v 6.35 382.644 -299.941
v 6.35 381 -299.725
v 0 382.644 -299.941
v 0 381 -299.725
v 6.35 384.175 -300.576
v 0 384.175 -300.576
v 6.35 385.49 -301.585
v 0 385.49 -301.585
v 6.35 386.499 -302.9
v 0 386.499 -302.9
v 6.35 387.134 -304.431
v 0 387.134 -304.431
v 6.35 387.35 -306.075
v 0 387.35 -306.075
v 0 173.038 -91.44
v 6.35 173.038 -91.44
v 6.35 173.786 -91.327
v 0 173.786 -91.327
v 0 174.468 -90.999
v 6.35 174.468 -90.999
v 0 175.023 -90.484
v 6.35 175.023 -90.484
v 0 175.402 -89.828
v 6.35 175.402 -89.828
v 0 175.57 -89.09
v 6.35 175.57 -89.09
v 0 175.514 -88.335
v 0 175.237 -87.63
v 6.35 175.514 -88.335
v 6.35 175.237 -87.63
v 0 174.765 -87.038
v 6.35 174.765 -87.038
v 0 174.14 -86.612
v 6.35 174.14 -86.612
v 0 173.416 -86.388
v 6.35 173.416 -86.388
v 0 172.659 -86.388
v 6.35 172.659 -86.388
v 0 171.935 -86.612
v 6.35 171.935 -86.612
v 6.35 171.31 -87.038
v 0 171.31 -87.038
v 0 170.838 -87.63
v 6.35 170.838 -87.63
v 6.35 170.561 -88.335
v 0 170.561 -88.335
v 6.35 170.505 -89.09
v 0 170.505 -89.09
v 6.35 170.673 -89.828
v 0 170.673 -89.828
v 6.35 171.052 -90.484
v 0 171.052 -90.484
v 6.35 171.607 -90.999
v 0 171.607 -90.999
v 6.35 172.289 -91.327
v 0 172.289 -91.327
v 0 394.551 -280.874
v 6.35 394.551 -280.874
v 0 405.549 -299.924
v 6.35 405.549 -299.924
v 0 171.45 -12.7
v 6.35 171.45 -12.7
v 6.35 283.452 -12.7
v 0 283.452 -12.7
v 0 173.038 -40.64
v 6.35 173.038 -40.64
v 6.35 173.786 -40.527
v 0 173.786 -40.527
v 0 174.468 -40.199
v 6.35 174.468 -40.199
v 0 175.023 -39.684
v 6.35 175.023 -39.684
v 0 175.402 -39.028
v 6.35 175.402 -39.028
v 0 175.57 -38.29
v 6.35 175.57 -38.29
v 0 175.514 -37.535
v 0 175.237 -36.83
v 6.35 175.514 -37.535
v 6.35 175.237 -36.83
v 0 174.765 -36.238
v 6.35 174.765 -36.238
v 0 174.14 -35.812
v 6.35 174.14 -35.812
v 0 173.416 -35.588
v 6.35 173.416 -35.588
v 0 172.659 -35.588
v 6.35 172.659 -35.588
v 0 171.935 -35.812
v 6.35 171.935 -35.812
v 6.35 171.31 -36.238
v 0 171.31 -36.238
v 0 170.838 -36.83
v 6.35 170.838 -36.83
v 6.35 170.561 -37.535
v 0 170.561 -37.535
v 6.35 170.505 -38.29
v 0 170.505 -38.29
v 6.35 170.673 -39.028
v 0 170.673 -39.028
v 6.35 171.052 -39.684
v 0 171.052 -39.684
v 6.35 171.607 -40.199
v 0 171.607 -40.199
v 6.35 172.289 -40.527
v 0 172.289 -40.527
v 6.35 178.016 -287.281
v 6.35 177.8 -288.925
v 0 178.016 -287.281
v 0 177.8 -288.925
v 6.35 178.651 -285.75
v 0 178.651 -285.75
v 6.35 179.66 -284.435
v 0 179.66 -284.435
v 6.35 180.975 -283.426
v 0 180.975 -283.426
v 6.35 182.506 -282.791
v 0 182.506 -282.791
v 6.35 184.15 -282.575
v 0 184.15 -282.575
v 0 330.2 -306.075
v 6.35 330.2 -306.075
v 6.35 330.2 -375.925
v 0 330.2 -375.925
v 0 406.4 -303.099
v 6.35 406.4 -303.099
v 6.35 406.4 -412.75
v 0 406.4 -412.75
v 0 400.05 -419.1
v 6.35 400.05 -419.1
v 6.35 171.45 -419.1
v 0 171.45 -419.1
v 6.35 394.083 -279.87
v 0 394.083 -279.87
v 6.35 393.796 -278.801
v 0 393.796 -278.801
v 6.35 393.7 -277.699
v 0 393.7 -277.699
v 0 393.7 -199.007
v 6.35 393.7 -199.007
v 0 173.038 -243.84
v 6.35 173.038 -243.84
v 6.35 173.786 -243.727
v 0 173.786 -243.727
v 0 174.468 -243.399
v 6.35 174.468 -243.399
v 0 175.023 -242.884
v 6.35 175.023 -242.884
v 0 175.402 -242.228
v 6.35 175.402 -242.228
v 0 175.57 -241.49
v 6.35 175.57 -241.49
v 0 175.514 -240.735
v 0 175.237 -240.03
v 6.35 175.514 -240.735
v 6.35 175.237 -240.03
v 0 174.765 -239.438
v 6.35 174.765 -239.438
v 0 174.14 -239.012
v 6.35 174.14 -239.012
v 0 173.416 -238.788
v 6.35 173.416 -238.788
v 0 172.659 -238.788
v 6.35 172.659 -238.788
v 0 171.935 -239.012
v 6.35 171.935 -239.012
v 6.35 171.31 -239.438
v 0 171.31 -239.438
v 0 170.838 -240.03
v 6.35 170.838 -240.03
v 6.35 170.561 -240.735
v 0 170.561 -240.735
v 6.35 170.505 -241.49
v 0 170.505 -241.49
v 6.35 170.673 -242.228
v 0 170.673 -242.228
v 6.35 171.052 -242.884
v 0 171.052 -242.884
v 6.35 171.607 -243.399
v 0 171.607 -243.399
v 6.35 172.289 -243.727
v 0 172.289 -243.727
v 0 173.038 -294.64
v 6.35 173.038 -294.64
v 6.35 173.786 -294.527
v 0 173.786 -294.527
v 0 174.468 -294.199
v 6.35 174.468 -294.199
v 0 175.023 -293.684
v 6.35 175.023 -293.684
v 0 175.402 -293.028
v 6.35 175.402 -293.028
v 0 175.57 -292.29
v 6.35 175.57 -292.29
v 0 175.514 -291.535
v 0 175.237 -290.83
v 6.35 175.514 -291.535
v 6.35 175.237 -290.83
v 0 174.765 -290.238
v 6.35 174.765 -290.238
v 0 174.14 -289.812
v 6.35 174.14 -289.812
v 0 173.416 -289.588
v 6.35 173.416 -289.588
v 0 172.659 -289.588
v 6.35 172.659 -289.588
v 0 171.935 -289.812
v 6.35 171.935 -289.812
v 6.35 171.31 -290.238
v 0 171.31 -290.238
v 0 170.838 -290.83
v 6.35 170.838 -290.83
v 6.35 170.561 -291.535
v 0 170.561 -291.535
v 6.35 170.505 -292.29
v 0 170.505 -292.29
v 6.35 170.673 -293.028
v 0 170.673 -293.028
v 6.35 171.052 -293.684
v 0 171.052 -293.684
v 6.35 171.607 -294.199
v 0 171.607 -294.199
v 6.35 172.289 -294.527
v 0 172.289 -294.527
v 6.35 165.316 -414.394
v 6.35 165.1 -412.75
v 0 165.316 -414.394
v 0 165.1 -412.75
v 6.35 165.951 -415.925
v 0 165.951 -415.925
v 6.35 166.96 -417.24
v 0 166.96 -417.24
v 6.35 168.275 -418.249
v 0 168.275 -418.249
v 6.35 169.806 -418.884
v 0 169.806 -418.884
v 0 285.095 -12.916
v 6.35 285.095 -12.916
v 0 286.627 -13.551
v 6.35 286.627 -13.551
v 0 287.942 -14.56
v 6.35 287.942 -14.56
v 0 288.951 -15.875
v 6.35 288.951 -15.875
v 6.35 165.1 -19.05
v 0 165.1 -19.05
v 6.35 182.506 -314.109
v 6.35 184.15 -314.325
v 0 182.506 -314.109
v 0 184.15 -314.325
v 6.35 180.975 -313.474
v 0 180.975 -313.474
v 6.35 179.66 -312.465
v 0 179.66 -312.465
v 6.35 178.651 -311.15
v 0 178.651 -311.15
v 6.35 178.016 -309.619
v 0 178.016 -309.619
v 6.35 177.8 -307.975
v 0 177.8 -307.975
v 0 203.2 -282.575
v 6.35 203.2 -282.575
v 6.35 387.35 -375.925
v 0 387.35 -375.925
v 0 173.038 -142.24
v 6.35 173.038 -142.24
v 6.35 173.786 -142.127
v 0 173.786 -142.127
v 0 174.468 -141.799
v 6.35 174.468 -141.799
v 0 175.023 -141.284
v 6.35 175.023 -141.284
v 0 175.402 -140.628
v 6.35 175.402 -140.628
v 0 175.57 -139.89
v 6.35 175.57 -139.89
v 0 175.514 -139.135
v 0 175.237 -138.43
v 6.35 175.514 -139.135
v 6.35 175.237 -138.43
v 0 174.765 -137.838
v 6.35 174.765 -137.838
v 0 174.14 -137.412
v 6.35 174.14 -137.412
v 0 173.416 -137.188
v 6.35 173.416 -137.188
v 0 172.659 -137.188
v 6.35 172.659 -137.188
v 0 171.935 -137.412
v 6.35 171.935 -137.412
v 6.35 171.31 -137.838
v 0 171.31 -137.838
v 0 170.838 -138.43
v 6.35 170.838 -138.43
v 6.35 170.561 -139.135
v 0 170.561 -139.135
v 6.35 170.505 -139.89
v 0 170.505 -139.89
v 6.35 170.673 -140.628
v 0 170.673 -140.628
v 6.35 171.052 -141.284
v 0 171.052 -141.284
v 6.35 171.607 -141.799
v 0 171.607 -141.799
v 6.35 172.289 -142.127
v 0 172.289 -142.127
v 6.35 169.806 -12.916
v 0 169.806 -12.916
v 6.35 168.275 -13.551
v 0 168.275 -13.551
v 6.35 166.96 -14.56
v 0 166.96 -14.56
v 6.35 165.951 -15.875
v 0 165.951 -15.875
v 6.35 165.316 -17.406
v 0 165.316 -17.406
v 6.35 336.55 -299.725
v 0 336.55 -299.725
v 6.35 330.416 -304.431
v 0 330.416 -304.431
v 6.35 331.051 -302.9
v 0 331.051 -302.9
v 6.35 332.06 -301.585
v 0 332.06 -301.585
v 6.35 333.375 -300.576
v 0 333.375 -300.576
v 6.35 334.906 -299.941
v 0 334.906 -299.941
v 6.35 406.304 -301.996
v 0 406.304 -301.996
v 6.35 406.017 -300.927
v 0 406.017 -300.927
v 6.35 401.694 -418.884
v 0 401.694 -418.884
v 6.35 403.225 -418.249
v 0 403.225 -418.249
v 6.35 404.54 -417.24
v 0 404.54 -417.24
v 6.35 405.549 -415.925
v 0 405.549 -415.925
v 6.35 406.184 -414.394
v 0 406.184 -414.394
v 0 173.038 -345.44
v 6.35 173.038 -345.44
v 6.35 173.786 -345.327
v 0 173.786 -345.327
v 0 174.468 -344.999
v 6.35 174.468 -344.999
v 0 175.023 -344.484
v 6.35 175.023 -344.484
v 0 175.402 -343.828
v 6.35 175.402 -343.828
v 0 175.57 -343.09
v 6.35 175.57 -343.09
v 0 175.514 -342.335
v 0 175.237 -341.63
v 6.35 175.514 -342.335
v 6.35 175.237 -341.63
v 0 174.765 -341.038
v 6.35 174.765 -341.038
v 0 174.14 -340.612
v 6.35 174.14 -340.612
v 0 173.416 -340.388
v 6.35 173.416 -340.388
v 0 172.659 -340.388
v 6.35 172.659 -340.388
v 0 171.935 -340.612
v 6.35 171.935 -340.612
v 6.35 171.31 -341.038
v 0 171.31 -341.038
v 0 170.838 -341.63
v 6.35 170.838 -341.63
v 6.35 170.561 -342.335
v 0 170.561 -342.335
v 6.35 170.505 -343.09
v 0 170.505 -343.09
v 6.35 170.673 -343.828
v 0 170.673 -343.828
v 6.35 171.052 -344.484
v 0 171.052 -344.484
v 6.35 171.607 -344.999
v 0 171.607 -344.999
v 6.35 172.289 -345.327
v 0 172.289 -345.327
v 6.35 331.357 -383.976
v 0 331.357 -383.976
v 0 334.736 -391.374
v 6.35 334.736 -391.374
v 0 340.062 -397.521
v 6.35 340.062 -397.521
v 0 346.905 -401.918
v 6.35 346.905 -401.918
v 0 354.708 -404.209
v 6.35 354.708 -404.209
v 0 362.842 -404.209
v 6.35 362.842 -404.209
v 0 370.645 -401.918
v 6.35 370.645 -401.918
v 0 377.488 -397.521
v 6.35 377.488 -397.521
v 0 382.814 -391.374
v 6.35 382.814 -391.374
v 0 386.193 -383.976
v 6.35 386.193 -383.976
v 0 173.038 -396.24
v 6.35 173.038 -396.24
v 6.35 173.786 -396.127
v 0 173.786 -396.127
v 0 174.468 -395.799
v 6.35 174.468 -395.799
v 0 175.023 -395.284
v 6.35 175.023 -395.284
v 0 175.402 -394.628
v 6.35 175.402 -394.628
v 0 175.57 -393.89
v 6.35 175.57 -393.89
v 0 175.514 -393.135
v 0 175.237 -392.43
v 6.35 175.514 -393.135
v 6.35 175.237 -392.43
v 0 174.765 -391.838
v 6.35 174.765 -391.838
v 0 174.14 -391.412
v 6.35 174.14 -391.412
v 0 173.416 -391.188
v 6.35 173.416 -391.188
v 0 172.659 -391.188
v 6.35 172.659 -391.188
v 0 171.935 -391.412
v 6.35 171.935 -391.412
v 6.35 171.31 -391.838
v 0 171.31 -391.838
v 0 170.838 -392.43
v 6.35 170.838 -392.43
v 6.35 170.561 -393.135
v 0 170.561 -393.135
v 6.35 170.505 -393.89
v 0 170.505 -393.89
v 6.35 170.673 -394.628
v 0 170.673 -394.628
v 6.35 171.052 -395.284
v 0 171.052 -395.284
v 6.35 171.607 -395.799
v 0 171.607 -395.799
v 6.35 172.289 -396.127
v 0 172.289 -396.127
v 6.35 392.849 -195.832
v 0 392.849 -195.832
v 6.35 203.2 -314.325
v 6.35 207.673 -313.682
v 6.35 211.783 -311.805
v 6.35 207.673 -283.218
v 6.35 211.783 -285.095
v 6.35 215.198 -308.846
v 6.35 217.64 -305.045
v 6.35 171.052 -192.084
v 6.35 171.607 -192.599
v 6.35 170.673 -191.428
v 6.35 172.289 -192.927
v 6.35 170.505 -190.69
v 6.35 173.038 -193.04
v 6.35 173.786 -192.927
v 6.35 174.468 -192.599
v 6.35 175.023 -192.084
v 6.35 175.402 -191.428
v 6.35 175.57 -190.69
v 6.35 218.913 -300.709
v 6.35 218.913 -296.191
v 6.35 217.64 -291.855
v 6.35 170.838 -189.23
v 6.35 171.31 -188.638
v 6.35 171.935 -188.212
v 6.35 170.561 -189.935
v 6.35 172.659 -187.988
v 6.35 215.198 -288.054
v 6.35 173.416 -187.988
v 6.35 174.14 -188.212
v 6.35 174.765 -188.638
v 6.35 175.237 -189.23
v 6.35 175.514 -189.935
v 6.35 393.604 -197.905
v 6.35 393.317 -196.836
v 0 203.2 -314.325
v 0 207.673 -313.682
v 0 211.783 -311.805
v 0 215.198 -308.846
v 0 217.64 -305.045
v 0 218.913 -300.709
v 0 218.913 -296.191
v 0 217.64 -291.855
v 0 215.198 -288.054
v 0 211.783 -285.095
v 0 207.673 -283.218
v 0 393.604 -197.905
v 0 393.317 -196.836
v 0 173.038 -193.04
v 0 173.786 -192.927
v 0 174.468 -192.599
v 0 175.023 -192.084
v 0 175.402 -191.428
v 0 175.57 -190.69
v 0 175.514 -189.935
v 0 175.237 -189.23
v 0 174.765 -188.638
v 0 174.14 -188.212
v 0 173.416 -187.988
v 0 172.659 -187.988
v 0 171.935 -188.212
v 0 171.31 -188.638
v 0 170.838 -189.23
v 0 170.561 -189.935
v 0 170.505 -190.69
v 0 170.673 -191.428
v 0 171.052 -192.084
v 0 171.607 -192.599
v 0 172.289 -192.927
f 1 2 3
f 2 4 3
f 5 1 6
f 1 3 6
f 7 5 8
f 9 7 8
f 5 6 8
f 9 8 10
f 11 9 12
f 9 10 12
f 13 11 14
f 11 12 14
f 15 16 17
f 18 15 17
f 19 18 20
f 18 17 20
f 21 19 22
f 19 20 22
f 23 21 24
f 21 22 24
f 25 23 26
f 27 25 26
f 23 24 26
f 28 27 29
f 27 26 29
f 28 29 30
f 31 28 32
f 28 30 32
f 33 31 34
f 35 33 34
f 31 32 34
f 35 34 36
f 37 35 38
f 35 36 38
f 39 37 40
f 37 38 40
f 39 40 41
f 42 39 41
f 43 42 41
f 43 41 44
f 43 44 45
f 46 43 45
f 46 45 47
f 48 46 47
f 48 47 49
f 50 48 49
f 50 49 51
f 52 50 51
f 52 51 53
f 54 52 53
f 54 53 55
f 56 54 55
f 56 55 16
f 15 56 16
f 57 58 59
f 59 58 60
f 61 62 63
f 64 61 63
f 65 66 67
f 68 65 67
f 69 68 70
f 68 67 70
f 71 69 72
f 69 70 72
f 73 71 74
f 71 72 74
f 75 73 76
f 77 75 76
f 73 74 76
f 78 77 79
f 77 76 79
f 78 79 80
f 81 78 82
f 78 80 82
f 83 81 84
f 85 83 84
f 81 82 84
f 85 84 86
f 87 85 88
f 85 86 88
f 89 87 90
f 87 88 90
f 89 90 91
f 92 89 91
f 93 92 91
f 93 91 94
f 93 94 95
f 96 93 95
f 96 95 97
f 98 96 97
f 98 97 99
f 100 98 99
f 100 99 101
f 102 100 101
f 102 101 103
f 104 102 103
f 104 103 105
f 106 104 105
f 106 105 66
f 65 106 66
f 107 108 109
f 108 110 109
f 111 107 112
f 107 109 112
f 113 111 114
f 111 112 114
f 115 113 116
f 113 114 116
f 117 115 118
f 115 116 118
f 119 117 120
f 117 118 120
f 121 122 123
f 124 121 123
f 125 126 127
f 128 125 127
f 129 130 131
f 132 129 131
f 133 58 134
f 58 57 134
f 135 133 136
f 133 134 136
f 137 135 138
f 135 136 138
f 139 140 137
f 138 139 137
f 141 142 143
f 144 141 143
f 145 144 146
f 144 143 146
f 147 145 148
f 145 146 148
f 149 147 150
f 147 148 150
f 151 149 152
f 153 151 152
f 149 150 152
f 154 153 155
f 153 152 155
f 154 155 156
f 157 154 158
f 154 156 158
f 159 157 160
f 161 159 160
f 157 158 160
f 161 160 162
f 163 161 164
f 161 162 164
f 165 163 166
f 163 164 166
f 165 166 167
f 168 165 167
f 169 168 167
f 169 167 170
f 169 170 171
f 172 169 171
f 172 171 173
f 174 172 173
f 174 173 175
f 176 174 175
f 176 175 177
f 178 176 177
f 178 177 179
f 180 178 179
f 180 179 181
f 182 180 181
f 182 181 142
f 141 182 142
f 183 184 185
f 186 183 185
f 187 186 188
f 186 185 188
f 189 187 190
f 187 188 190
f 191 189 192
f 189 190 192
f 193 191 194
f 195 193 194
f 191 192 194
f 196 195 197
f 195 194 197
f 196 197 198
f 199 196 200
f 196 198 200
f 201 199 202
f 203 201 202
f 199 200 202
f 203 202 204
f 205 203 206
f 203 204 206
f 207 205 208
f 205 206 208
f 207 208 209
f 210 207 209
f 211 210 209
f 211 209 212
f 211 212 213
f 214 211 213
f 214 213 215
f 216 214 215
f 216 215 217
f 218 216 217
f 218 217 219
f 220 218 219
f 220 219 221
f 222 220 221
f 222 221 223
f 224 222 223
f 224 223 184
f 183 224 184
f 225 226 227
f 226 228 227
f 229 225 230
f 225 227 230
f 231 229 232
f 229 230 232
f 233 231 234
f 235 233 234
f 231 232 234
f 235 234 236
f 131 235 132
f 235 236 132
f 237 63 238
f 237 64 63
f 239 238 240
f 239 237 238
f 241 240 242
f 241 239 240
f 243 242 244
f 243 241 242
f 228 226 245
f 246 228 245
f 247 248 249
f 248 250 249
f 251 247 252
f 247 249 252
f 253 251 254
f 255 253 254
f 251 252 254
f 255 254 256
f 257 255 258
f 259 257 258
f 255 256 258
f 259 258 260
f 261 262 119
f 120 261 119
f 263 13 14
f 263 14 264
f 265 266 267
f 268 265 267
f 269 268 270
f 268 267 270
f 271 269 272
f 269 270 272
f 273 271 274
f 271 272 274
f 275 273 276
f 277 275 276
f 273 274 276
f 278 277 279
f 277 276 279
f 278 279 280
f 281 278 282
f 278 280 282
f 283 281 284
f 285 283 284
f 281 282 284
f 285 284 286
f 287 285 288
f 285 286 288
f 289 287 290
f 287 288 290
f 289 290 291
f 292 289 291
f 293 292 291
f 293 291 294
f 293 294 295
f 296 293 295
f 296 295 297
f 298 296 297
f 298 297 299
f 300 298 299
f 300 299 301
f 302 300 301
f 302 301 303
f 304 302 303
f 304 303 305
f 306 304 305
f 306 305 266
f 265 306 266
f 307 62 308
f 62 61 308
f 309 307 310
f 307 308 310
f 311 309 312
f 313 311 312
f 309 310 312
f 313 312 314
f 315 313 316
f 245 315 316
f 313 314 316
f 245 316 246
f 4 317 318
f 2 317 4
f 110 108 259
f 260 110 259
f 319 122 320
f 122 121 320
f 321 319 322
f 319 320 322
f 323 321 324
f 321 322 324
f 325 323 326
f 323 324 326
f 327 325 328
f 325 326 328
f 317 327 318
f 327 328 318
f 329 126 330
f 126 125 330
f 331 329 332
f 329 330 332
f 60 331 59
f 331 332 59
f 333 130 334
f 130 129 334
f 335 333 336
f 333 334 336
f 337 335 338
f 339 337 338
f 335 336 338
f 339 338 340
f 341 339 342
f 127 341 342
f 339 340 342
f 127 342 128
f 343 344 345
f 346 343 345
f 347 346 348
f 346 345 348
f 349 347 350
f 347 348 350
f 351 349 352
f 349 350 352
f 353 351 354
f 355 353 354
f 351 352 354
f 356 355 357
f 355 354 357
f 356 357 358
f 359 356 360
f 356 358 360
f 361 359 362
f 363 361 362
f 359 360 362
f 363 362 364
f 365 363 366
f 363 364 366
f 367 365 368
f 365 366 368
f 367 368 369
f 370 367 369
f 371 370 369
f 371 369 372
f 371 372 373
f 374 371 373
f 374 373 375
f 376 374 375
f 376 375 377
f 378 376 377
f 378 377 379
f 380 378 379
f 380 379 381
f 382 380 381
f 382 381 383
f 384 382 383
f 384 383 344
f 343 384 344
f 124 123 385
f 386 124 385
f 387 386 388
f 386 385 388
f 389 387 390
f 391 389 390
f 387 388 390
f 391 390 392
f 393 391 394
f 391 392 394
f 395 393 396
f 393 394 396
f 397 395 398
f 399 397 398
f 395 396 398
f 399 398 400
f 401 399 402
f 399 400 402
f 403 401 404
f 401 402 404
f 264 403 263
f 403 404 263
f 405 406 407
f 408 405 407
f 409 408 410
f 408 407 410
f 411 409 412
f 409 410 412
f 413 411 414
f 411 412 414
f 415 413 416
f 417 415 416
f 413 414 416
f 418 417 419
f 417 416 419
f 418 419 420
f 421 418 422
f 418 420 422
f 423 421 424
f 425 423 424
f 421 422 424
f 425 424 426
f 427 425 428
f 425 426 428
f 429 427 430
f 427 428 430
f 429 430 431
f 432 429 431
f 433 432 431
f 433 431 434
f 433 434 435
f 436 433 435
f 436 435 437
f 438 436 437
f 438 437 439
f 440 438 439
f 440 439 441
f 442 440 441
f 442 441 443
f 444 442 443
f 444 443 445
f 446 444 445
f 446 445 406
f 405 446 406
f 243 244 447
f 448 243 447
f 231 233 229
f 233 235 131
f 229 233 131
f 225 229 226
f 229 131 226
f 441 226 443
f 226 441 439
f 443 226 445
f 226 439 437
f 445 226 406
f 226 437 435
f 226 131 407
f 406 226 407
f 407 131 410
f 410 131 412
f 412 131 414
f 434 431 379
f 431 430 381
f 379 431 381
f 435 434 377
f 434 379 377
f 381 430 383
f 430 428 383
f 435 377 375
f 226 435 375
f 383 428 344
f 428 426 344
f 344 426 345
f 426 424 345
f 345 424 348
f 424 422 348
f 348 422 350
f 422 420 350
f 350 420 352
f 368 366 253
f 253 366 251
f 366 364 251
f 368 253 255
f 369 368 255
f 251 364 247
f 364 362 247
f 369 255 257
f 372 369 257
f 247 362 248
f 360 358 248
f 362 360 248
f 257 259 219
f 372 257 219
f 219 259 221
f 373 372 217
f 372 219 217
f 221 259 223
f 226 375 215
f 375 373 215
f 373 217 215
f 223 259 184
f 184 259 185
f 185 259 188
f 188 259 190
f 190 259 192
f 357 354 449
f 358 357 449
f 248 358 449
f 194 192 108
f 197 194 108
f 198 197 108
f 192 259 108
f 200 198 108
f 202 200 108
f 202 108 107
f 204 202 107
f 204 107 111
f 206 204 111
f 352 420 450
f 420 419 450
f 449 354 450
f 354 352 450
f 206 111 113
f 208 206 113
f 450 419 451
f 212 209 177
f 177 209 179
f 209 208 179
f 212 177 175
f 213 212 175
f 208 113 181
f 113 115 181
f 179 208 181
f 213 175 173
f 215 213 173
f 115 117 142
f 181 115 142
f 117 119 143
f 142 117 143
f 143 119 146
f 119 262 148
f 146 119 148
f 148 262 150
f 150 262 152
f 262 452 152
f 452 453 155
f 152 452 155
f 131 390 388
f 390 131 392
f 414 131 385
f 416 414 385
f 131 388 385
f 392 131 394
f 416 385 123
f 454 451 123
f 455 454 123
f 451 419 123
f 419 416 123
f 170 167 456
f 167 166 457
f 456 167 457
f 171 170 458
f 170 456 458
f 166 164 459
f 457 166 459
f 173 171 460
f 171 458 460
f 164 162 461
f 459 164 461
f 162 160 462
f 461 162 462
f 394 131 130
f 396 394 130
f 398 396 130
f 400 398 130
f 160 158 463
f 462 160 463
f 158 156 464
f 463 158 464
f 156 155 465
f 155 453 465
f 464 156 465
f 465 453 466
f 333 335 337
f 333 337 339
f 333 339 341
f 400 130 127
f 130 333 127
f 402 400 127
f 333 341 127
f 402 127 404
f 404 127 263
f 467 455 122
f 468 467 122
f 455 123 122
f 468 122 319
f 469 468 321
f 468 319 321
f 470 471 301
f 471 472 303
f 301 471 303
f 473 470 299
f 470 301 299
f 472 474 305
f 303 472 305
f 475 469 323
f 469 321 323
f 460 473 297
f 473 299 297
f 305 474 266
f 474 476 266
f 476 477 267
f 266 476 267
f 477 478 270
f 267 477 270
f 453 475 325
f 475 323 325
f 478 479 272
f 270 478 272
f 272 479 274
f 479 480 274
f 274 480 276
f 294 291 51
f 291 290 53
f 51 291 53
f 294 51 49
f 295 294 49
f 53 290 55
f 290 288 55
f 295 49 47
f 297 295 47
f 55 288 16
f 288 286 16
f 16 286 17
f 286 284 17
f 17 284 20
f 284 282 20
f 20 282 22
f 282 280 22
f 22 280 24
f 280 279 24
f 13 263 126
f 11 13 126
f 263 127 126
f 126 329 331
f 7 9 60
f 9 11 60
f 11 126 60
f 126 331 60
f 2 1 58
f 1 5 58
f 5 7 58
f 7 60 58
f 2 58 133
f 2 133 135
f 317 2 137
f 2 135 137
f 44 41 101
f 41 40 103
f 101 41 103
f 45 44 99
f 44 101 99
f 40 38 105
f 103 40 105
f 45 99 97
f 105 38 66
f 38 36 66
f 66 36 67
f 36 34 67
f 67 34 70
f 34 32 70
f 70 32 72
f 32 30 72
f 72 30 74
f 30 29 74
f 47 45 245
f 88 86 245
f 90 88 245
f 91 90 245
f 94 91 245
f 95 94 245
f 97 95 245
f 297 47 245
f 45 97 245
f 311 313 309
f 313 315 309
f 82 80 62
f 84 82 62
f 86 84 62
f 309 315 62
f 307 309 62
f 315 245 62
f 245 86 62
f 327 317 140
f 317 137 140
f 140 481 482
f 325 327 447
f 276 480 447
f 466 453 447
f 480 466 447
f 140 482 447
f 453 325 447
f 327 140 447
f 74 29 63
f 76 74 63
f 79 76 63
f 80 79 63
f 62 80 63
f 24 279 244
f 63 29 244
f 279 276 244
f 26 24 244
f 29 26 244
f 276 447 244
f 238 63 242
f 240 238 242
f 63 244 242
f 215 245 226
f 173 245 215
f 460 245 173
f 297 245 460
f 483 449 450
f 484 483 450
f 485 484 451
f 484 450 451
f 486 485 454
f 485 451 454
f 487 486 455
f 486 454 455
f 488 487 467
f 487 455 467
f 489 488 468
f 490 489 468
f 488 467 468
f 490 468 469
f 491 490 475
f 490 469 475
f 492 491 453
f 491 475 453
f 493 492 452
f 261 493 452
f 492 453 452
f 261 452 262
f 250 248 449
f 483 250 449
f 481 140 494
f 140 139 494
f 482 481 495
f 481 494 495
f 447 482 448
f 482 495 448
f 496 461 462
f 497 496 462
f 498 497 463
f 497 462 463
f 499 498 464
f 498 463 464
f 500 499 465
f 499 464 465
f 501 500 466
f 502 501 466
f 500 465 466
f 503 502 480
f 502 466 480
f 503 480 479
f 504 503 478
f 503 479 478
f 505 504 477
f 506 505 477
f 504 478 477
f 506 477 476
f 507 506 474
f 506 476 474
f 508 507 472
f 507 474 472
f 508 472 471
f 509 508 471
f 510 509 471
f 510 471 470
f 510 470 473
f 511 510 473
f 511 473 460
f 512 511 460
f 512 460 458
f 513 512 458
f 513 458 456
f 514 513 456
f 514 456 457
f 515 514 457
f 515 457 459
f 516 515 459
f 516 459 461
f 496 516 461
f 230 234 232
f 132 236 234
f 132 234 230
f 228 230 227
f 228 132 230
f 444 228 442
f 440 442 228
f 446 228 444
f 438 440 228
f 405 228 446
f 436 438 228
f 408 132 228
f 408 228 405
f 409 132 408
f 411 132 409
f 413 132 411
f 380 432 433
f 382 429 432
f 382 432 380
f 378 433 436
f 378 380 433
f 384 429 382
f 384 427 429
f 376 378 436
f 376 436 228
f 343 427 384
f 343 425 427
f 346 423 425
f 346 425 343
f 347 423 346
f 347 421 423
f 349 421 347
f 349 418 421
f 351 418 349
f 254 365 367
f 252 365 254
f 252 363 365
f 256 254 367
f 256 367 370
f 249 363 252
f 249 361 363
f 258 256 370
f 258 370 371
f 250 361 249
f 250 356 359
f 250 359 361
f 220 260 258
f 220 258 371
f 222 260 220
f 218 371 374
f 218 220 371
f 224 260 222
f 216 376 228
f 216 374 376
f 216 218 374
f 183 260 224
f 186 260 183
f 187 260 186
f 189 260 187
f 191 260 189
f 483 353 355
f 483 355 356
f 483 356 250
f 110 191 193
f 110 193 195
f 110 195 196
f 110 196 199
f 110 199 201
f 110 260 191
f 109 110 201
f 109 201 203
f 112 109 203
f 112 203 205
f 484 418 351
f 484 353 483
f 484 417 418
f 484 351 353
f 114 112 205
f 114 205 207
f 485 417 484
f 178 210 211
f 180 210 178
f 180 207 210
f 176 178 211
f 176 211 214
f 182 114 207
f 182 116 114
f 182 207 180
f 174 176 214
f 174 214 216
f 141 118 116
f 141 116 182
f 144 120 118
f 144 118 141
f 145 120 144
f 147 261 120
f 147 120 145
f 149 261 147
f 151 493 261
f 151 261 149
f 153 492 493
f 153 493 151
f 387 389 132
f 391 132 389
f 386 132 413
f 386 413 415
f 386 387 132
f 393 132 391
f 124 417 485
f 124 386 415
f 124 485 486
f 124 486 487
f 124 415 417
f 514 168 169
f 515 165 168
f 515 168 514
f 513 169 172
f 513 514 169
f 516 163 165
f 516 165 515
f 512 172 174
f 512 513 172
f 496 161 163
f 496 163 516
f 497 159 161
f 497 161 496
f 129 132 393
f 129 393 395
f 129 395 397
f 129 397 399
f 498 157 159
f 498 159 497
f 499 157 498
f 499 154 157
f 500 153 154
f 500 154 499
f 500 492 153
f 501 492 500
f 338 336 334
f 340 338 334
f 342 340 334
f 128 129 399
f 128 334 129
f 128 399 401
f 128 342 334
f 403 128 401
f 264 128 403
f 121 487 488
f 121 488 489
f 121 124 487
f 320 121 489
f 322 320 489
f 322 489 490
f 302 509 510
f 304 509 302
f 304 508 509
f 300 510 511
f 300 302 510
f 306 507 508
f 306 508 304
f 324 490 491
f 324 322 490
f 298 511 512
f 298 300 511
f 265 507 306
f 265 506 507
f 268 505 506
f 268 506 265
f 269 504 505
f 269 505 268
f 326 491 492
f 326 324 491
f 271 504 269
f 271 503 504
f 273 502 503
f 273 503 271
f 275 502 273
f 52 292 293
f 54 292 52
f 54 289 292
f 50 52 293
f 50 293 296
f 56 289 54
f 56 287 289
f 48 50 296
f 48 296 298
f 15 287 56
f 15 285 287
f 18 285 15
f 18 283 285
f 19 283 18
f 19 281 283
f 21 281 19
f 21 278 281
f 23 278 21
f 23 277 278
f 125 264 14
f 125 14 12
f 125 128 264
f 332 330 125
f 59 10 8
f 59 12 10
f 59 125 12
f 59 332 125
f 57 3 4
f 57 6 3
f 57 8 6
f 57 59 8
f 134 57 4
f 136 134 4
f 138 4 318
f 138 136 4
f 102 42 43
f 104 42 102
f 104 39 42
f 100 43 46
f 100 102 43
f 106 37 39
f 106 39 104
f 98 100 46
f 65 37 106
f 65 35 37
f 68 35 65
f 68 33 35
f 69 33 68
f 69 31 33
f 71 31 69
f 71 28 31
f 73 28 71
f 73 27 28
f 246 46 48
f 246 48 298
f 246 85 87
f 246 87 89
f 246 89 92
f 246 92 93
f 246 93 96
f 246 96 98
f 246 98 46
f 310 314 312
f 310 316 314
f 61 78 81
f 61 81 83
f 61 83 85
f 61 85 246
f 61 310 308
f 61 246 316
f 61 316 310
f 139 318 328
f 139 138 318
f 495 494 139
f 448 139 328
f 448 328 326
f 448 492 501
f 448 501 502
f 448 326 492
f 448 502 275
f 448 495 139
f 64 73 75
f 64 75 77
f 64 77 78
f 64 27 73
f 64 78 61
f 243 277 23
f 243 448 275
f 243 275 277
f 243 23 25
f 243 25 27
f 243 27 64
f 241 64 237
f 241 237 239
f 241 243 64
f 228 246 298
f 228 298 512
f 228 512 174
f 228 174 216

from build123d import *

# Parameters (mm, degrees)
BOSS_EXTRUDE1_DEPTH = 6.35
SKETCH3_R           = 3.96875
CUT_EXTRUDE1_DEPTH  = 7.35
SKETCH5_W           = 6.35
SKETCH5_H           = 12.7
CUT_EXTRUDE3_DEPTH  = 7.35
LPATTERN1_COUNT     = 16
LPATTERN1_PITCH     = 25.4
SKETCH6_W           = 6.35
SKETCH6_H           = 12.7
CUT_EXTRUDE4_DEPTH  = 7.35
LPATTERN2_COUNT     = 11
LPATTERN2_PITCH     = 25.4
SKETCH7_W           = 6.35
SKETCH7_H           = 12.7
SKETCH7_W_2         = 12.7
SKETCH7_H_2         = 6.35
CUT_EXTRUDE5_DEPTH  = 7.35
CUT_EXTRUDE6_DEPTH  = 7.35
LPATTERN3_COUNT     = 10
LPATTERN3_PITCH     = 25.4
SKETCH9_W           = 12.7
SKETCH9_H           = 6.35
CUT_EXTRUDE7_DEPTH  = 7.35
LPATTERN4_COUNT     = 8
LPATTERN4_PITCH     = 25.4
SKETCH10_R          = 3.175
CUT_EXTRUDE8_DEPTH  = 7.35
SKETCH11_R          = 3.96875
CUT_EXTRUDE9_DEPTH  = 7.35
SKETCH12_W          = 6.35
SKETCH12_H          = 12.7
CUT_EXTRUDE13_DEPTH = 7.35
CUT_EXTRUDE15_DEPTH = 7.35
CUT_EXTRUDE16_DEPTH = 7.35
SKETCH17_W          = 12.7
SKETCH17_H          = 6.35
CUT_EXTRUDE17_DEPTH = 7.35
LPATTERN5_COUNT     = 17
LPATTERN5_PITCH     = 25.4
LPATTERN6_COUNT     = 2
LPATTERN6_PITCH     = 120.65
SKETCH18_W          = 12.7
SKETCH18_H          = 6.35
CUT_EXTRUDE18_DEPTH = 7.35
LPATTERN7_COUNT     = 5
LPATTERN7_PITCH     = 25.4
CUT_EXTRUDE19_DEPTH = 7.35
SKETCH20_W          = 101.6
SKETCH20_H          = 57.15
CUT_EXTRUDE20_DEPTH = 7.35
CUT_EXTRUDE21_DEPTH = 7.35
CUT_EXTRUDE22_DEPTH = 7.35
BOSS_EXTRUDE4_DEPTH = 6.35
BOSS_EXTRUDE5_DEPTH = 6.35
CUT_EXTRUDE23_DEPTH = 7.35
CUT_EXTRUDE24_DEPTH = 7.35
FILLET1_R           = 6.35
SKETCH30_R          = 2.54
CUT_EXTRUDE25_DEPTH = 7.35
SKETCH31_W          = 76.2
SKETCH31_H          = 57.15
CUT_EXTRUDE26_DEPTH = 7.35
CUT_EXTRUDE27_DEPTH = 7.35
SKETCH33_W          = 110.352574347
SKETCH33_H          = 42.11476807
CUT_EXTRUDE28_DEPTH = 7.35
FILLET2_R           = 6.35


with BuildPart() as part:
    # Sketch2 → Boss-Extrude1 (new body)
    with BuildSketch(Plane(origin=(0, 0, 0), x_dir=(0, 0, -1), z_dir=(1, 0, 0))):
        Polygon((0, 0), (0, 294.450076882), (215.9, 419.1), (431.8, 419.1), (431.8, 0), (241.3, 0), (241.3, 38.1), (127, 38.1), (127, 0), align=None)
    extrude(amount=BOSS_EXTRUDE1_DEPTH)

    # Sketch3 → Cut-Extrude1 (cut, through all)
    with BuildSketch(Plane(origin=(6.35, 0, 0), x_dir=(0, 0, -1), z_dir=(1, 0, 0))):
        with Locations((63.5, 38.1)):
            Circle(SKETCH3_R)
        with Locations((368.3, 38.1)):
            Circle(SKETCH3_R)
    extrude(amount=-CUT_EXTRUDE1_DEPTH, mode=Mode.SUBTRACT)

    # Sketch5 → Cut-Extrude3 (cut, through all)
    with BuildSketch(Plane(origin=(6.35, 0, 0), x_dir=(0, 0, -1), z_dir=(1, 0, 0))):
        with Locations((428.625, 19.05)):
            Rectangle(SKETCH5_W, SKETCH5_H)
    cut_extrude3 = extrude(amount=-CUT_EXTRUDE3_DEPTH, mode=Mode.SUBTRACT)

    # LPattern1: Cut-Extrude3 ×16
    with Locations(*[(0, i * LPATTERN1_PITCH, 0) for i in range(1, LPATTERN1_COUNT)]):
        add(cut_extrude3, mode=Mode.SUBTRACT)

    # Sketch6 → Cut-Extrude4 (cut, through all)
    with BuildSketch(Plane(origin=(6.35, 0, 0), x_dir=(0, 0, -1), z_dir=(1, 0, 0))):
        with Locations((3.175, 19.05)):
            Rectangle(SKETCH6_W, SKETCH6_H)
    cut_extrude4 = extrude(amount=-CUT_EXTRUDE4_DEPTH, mode=Mode.SUBTRACT)

    # LPattern2: Cut-Extrude4 ×11
    with Locations(*[(0, i * LPATTERN2_PITCH, 0) for i in range(1, LPATTERN2_COUNT)]):
        add(cut_extrude4, mode=Mode.SUBTRACT)

    # Sketch7 → Cut-Extrude5 (cut, through all)
    with BuildSketch(Plane(origin=(6.35, 0, 0), x_dir=(0, 0, -1), z_dir=(1, 0, 0))):
        with Locations((123.825, 19.05)):
            Rectangle(SKETCH7_W, SKETCH7_H)
        with Locations((133.35, 41.275)):
            Rectangle(SKETCH7_W_2, SKETCH7_H_2)
        with Locations((158.75, 41.275)):
            Rectangle(SKETCH7_W_2, SKETCH7_H_2)
        with Locations((184.15, 41.275)):
            Rectangle(SKETCH7_W_2, SKETCH7_H_2)
        with Locations((244.475, 19.05)):
            Rectangle(SKETCH7_W, SKETCH7_H)
        with Locations((209.55, 41.275)):
            Rectangle(SKETCH7_W_2, SKETCH7_H_2)
        with Locations((234.95, 41.275)):
            Rectangle(SKETCH7_W_2, SKETCH7_H_2)
    extrude(amount=-CUT_EXTRUDE5_DEPTH, mode=Mode.SUBTRACT)

    # Sketch8 → Cut-Extrude6 (cut, through all)
    with BuildSketch(Plane(origin=(6.35, 0, 0), x_dir=(0, 0, -1), z_dir=(1, 0, 0))):
        Polygon((201.93507044, 411.037344159), (212.933593068, 417.387344159), (216.108593068, 411.888082845), (205.11007044, 405.538082845), align=None)
    cut_extrude6 = extrude(amount=-CUT_EXTRUDE6_DEPTH, mode=Mode.SUBTRACT)

    # LPattern3: Cut-Extrude6 ×10
    with Locations(*[Vector(0, -0.5, 0.866025404) * (i * LPATTERN3_PITCH) for i in range(1, LPATTERN3_COUNT)]):
        add(cut_extrude6, mode=Mode.SUBTRACT)

    # Sketch9 → Cut-Extrude7 (cut, through all)
    with BuildSketch(Plane(origin=(6.35, 0, 0), x_dir=(0, 0, -1), z_dir=(1, 0, 0))):
        with Locations((412.75, 415.925)):
            Rectangle(SKETCH9_W, SKETCH9_H)
    cut_extrude7 = extrude(amount=-CUT_EXTRUDE7_DEPTH, mode=Mode.SUBTRACT)

    # LPattern4: Cut-Extrude7 ×8
    with Locations(*[(0, 0, i * LPATTERN4_PITCH) for i in range(1, LPATTERN4_COUNT)]):
        add(cut_extrude7, mode=Mode.SUBTRACT)

    # Sketch10 → Cut-Extrude8 (cut, through all)
    with BuildSketch(Plane(origin=(6.35, 0, 0), x_dir=(0, 0, -1), z_dir=(1, 0, 0))):
        with Locations((222.25, 273.05)):
            Circle(SKETCH10_R)
        with Locations((222.25, 57.15)):
            Circle(SKETCH10_R)
        with Locations((146.05, 57.15)):
            Circle(SKETCH10_R)
        with Locations((146.05, 273.05)):
            Circle(SKETCH10_R)
    extrude(amount=-CUT_EXTRUDE8_DEPTH, mode=Mode.SUBTRACT)

    # Sketch11 → Cut-Extrude9 (cut, through all)
    with BuildSketch(Plane(origin=(6.35, 0, 0), x_dir=(0, 0, -1), z_dir=(1, 0, 0))):
        with Locations((38.1, 260.35)):
            Circle(SKETCH11_R)
        with Locations((266.7, 260.35)):
            Circle(SKETCH11_R)
    extrude(amount=-CUT_EXTRUDE9_DEPTH, mode=Mode.SUBTRACT)

    # Sketch12 → Cut-Extrude13 (cut, through all)
    with BuildSketch(Plane(origin=(6.35, 0, 0), x_dir=(0, 0, -1), z_dir=(1, 0, 0))):
        with Locations((123.825, 44.45)):
            Rectangle(SKETCH12_W, SKETCH12_H)
        with Locations((123.825, 69.85)):
            Rectangle(SKETCH12_W, SKETCH12_H)
        with Locations((123.825, 95.25)):
            Rectangle(SKETCH12_W, SKETCH12_H)
        with Locations((123.825, 120.65)):
            Rectangle(SKETCH12_W, SKETCH12_H)
    cut_extrude13 = extrude(amount=-CUT_EXTRUDE13_DEPTH, mode=Mode.SUBTRACT)

    # Sketch14 → Cut-Extrude15 (cut, through all)
    with BuildSketch(Plane(origin=(6.35, 0, 0), x_dir=(0, 0, -1), z_dir=(1, 0, 0))):
        Polygon((36.957231019, 315.787344159), (47.955753647, 322.137344159), (51.130753647, 316.638082845), (40.132231019, 310.288082845), align=None)
        Polygon((80.951321531, 341.187344159), (91.949844159, 347.537344159), (95.124844159, 342.038082845), (84.126321531, 335.688082845), align=None)
    extrude(amount=-CUT_EXTRUDE15_DEPTH, mode=Mode.SUBTRACT)

    # Sketch15 → Cut-Extrude16 (cut, through all)
    with BuildSketch(Plane(origin=(6.35, 0, 0), x_dir=(0, 0, -1), z_dir=(1, 0, 0))):
        with BuildLine():
            Line((62.129276275, 322.988082845), (31.558579521, 305.338082845))
            ThreePointArc((31.558579521, 305.338082845), (51.535904978, 302.314952438), (62.501260575, 319.285333297))
            ThreePointArc((62.501260575, 319.285333297), (62.408031035, 321.146027155), (62.129276275, 322.988082845))
        make_face()
        with BuildLine():
            Line((103.698495657, 346.988082845), (73.127798903, 329.338082845))
            ThreePointArc((73.127798903, 329.338082845), (93.10512436, 326.314952438), (104.070479957, 343.285333297))
            ThreePointArc((104.070479957, 343.285333297), (103.977250417, 345.146027155), (103.698495657, 346.988082845))
        make_face()
    extrude(amount=-CUT_EXTRUDE16_DEPTH, mode=Mode.SUBTRACT)

    # Sketch17 → Cut-Extrude17 (cut, through all)
    with BuildSketch(Plane(origin=(6.35, 0, 0), x_dir=(0, 0, -1), z_dir=(1, 0, 0))):
        with Locations((25.4, 142.875)):
            Rectangle(SKETCH17_W, SKETCH17_H)
    cut_extrude17 = extrude(amount=-CUT_EXTRUDE17_DEPTH, mode=Mode.SUBTRACT)

    # LPattern5: Cut-Extrude17 ×17
    with Locations(*[(0, 0, -i * LPATTERN5_PITCH) for i in range(1, LPATTERN5_COUNT)]):
        add(cut_extrude17, mode=Mode.SUBTRACT)

    # LPattern6: Cut-Extrude13 ×2
    with Locations(*[(0, 0, -i * LPATTERN6_PITCH) for i in range(1, LPATTERN6_COUNT)]):
        add(cut_extrude13, mode=Mode.SUBTRACT)

    # Sketch18 → Cut-Extrude18 (cut, through all)
    with BuildSketch(Plane(origin=(6.35, 0, 0), x_dir=(0, 0, -1), z_dir=(1, 0, 0))):
        with Locations((133.35, 117.475)):
            Rectangle(SKETCH18_W, SKETCH18_H)
    cut_extrude18 = extrude(amount=-CUT_EXTRUDE18_DEPTH, mode=Mode.SUBTRACT)

    # LPattern7: Cut-Extrude18 ×5
    with Locations(*[(0, 0, -i * LPATTERN7_PITCH) for i in range(1, LPATTERN7_COUNT)]):
        add(cut_extrude18, mode=Mode.SUBTRACT)

    # Sketch19 → Cut-Extrude19 (cut, through all)
    with BuildSketch(Plane(origin=(6.35, 0, 0), x_dir=(0, 0, -1), z_dir=(1, 0, 0))):
        Polygon((25.4, 279.785380045), (222.705909488, 393.7), (406.4, 393.7), (406.4, 165.1), (25.4, 165.1), align=None)
    extrude(amount=-CUT_EXTRUDE19_DEPTH, mode=Mode.SUBTRACT)

    # Sketch20 → Cut-Extrude20 (cut, through all)
    with BuildSketch(Plane(origin=(6.35, 0, 0), x_dir=(0, 0, -1), z_dir=(1, 0, 0))):
        with Locations((184.15, 79.375)):
            Rectangle(SKETCH20_W, SKETCH20_H)
    extrude(amount=-CUT_EXTRUDE20_DEPTH, mode=Mode.SUBTRACT)

    # Sketch21 → Cut-Extrude21 (cut, through all)
    with BuildSketch(Plane(origin=(6.35, 0, 0), x_dir=(0, 0, -1), z_dir=(1, 0, 0))):
        Polygon((266.7, 25.4), (308.202954744, 25.4), (406.4, 82.094090512), (406.4, 133.35), (266.7, 133.35), align=None)
        Polygon((25.4, 133.35), (25.4, 82.094090512), (101.6, 38.1), (101.6, 133.35), align=None)
        Polygon((25.4, 38.1), (25.4, 25.4), (47.397045256, 25.4), align=None)
    extrude(amount=-CUT_EXTRUDE21_DEPTH, mode=Mode.SUBTRACT)

    # Sketch22 → Cut-Extrude22 (cut, through all)
    with BuildSketch(Plane(origin=(6.35, 0, 0), x_dir=(0, 0, -1), z_dir=(1, 0, 0))):
        Polygon((384.402954744, 25.4), (406.4, 38.1), (406.4, 25.4), align=None)
    extrude(amount=-CUT_EXTRUDE22_DEPTH, mode=Mode.SUBTRACT)

    # Sketch26 → Boss-Extrude4 (add, through all)
    with BuildSketch(Plane(origin=(6.35, 0, 0), x_dir=(0, 0, -1), z_dir=(1, 0, 0))):
        Polygon((266.7, 133.35), (266.7, 126.280871047), (278.944090512, 133.35), align=None)
        Polygon((89.355909488, 133.35), (101.6, 126.280871047), (101.6, 133.35), align=None)
        Polygon((266.7, 32.469128953), (278.944090512, 25.4), (266.7, 25.4), align=None)
        Polygon((133.35, 107.95), (133.35, 100.880871047), (145.594090512, 107.95), align=None)
        Polygon((234.95, 107.95), (222.705909488, 107.95), (234.95, 100.880871047), align=None)
        Polygon((133.35, 50.8), (145.594090512, 50.8), (133.35, 57.869128953), align=None)
        Polygon((234.95, 50.8), (222.705909488, 50.8), (234.95, 57.869128953), align=None)
    extrude(amount=-BOSS_EXTRUDE4_DEPTH)


with BuildPart() as body_2:
    # Sketch27 → Boss-Extrude5 (new body)
    with BuildSketch(Plane(origin=(6.35, 0, 0), x_dir=(0, 0, -1), z_dir=(1, 0, 0))):
        Polygon((12.7, 165.1), (12.7, 287.117728463), (219.302954744, 406.4), (419.1, 406.4), (419.1, 165.1), align=None)
    extrude(amount=-BOSS_EXTRUDE5_DEPTH)

    # Sketch28 → Cut-Extrude23 (cut, through all)
    with BuildSketch(Plane(origin=(6.35, 0, 0), x_dir=(0, 0, -1), z_dir=(1, 0, 0))):
        Polygon((251.052954744, 406.4), (273.05, 393.7), (279.4, 393.7), (301.397045256, 406.4), align=None)
    extrude(amount=-CUT_EXTRUDE23_DEPTH, mode=Mode.SUBTRACT)

    # Sketch29 → Cut-Extrude24 (cut, through all)
    with BuildSketch(Plane(origin=(6.35, 0, 0), x_dir=(0, 0, -1), z_dir=(1, 0, 0))):
        with BuildLine():
            Line((282.575, 203.2), (282.575, 177.8))
            Line((282.575, 177.8), (314.325, 177.8))
            Line((314.325, 177.8), (314.325, 203.2))
            ThreePointArc((314.325, 203.2), (298.45, 219.075), (282.575, 203.2))
        make_face()
    extrude(amount=-CUT_EXTRUDE24_DEPTH, mode=Mode.SUBTRACT)

    # Fillet1
    fillet1_edges = [body_2.edges().sort_by_distance(p)[0] for p in [
        (3.175, 406.4, -251.052954744),
        (3.175, 406.4, -301.397045256),
        (3.175, 393.7, -279.4),
        (3.175, 393.7, -273.05),
        (3.175, 177.8, -314.325),
        (3.175, 177.8, -282.575),
        (3.175, 165.1, -12.7),
        (3.175, 287.117728463, -12.7),
        (3.175, 406.4, -219.302954744),
        (3.175, 406.4, -419.1),
        (3.175, 165.1, -419.1),
    ]]
    fillet(fillet1_edges, radius=FILLET1_R)

    # Sketch30 → Cut-Extrude25 (cut, through all)
    with BuildSketch(Plane(origin=(6.35, 0, 0), x_dir=(0, 0, -1), z_dir=(1, 0, 0))):
        with Locations((38.1, 173.0375)):
            Circle(SKETCH30_R)
        with Locations((88.9, 173.0375)):
            Circle(SKETCH30_R)
        with Locations((139.7, 173.0375)):
            Circle(SKETCH30_R)
        with Locations((190.5, 173.0375)):
            Circle(SKETCH30_R)
        with Locations((241.3, 173.0375)):
            Circle(SKETCH30_R)
        with Locations((292.1, 173.0375)):
            Circle(SKETCH30_R)
        with Locations((342.9, 173.0375)):
            Circle(SKETCH30_R)
        with Locations((393.7, 173.0375)):
            Circle(SKETCH30_R)
    extrude(amount=-CUT_EXTRUDE25_DEPTH, mode=Mode.SUBTRACT)

    # Sketch31 → Cut-Extrude26 (cut, through all)
    with BuildSketch(Plane(origin=(6.35, 0, 0), x_dir=(0, 0, -1), z_dir=(1, 0, 0))):
        with Locations((337.82499999, 358.775)):
            Rectangle(SKETCH31_W, SKETCH31_H)
    extrude(amount=-CUT_EXTRUDE26_DEPTH, mode=Mode.SUBTRACT)

    # Sketch32 → Cut-Extrude27 (cut, through all)
    with BuildSketch(Plane(origin=(6.35, 0, 0), x_dir=(0, 0, -1), z_dir=(1, 0, 0))):
        with BuildLine():
            Line((375.92499999, 387.35), (375.92499999, 330.2))
            ThreePointArc((375.92499999, 330.2), (404.49999999, 358.775), (375.92499999, 387.35))
        make_face()
    extrude(amount=-CUT_EXTRUDE27_DEPTH, mode=Mode.SUBTRACT)

    # Sketch33 → Cut-Extrude28 (cut, through all)
    with BuildSketch(Plane(origin=(6.35, 0, 0), x_dir=(0, 0, -1), z_dir=(1, 0, 0))):
        with Locations((219.575190199, 414.757384035)):
            Rectangle(SKETCH33_W, SKETCH33_H)
    extrude(amount=-CUT_EXTRUDE28_DEPTH, mode=Mode.SUBTRACT)

    # Fillet2
    fillet2_edges = [body_2.edges().sort_by_distance(p)[0] for p in [
        (3.175, 330.2, -299.72499999),
        (3.175, 387.35, -299.72499999),
        (3.175, 393.7, -197.305909488),
    ]]
    fillet(fillet2_edges, radius=FILLET2_R)


solid = body_2.part
